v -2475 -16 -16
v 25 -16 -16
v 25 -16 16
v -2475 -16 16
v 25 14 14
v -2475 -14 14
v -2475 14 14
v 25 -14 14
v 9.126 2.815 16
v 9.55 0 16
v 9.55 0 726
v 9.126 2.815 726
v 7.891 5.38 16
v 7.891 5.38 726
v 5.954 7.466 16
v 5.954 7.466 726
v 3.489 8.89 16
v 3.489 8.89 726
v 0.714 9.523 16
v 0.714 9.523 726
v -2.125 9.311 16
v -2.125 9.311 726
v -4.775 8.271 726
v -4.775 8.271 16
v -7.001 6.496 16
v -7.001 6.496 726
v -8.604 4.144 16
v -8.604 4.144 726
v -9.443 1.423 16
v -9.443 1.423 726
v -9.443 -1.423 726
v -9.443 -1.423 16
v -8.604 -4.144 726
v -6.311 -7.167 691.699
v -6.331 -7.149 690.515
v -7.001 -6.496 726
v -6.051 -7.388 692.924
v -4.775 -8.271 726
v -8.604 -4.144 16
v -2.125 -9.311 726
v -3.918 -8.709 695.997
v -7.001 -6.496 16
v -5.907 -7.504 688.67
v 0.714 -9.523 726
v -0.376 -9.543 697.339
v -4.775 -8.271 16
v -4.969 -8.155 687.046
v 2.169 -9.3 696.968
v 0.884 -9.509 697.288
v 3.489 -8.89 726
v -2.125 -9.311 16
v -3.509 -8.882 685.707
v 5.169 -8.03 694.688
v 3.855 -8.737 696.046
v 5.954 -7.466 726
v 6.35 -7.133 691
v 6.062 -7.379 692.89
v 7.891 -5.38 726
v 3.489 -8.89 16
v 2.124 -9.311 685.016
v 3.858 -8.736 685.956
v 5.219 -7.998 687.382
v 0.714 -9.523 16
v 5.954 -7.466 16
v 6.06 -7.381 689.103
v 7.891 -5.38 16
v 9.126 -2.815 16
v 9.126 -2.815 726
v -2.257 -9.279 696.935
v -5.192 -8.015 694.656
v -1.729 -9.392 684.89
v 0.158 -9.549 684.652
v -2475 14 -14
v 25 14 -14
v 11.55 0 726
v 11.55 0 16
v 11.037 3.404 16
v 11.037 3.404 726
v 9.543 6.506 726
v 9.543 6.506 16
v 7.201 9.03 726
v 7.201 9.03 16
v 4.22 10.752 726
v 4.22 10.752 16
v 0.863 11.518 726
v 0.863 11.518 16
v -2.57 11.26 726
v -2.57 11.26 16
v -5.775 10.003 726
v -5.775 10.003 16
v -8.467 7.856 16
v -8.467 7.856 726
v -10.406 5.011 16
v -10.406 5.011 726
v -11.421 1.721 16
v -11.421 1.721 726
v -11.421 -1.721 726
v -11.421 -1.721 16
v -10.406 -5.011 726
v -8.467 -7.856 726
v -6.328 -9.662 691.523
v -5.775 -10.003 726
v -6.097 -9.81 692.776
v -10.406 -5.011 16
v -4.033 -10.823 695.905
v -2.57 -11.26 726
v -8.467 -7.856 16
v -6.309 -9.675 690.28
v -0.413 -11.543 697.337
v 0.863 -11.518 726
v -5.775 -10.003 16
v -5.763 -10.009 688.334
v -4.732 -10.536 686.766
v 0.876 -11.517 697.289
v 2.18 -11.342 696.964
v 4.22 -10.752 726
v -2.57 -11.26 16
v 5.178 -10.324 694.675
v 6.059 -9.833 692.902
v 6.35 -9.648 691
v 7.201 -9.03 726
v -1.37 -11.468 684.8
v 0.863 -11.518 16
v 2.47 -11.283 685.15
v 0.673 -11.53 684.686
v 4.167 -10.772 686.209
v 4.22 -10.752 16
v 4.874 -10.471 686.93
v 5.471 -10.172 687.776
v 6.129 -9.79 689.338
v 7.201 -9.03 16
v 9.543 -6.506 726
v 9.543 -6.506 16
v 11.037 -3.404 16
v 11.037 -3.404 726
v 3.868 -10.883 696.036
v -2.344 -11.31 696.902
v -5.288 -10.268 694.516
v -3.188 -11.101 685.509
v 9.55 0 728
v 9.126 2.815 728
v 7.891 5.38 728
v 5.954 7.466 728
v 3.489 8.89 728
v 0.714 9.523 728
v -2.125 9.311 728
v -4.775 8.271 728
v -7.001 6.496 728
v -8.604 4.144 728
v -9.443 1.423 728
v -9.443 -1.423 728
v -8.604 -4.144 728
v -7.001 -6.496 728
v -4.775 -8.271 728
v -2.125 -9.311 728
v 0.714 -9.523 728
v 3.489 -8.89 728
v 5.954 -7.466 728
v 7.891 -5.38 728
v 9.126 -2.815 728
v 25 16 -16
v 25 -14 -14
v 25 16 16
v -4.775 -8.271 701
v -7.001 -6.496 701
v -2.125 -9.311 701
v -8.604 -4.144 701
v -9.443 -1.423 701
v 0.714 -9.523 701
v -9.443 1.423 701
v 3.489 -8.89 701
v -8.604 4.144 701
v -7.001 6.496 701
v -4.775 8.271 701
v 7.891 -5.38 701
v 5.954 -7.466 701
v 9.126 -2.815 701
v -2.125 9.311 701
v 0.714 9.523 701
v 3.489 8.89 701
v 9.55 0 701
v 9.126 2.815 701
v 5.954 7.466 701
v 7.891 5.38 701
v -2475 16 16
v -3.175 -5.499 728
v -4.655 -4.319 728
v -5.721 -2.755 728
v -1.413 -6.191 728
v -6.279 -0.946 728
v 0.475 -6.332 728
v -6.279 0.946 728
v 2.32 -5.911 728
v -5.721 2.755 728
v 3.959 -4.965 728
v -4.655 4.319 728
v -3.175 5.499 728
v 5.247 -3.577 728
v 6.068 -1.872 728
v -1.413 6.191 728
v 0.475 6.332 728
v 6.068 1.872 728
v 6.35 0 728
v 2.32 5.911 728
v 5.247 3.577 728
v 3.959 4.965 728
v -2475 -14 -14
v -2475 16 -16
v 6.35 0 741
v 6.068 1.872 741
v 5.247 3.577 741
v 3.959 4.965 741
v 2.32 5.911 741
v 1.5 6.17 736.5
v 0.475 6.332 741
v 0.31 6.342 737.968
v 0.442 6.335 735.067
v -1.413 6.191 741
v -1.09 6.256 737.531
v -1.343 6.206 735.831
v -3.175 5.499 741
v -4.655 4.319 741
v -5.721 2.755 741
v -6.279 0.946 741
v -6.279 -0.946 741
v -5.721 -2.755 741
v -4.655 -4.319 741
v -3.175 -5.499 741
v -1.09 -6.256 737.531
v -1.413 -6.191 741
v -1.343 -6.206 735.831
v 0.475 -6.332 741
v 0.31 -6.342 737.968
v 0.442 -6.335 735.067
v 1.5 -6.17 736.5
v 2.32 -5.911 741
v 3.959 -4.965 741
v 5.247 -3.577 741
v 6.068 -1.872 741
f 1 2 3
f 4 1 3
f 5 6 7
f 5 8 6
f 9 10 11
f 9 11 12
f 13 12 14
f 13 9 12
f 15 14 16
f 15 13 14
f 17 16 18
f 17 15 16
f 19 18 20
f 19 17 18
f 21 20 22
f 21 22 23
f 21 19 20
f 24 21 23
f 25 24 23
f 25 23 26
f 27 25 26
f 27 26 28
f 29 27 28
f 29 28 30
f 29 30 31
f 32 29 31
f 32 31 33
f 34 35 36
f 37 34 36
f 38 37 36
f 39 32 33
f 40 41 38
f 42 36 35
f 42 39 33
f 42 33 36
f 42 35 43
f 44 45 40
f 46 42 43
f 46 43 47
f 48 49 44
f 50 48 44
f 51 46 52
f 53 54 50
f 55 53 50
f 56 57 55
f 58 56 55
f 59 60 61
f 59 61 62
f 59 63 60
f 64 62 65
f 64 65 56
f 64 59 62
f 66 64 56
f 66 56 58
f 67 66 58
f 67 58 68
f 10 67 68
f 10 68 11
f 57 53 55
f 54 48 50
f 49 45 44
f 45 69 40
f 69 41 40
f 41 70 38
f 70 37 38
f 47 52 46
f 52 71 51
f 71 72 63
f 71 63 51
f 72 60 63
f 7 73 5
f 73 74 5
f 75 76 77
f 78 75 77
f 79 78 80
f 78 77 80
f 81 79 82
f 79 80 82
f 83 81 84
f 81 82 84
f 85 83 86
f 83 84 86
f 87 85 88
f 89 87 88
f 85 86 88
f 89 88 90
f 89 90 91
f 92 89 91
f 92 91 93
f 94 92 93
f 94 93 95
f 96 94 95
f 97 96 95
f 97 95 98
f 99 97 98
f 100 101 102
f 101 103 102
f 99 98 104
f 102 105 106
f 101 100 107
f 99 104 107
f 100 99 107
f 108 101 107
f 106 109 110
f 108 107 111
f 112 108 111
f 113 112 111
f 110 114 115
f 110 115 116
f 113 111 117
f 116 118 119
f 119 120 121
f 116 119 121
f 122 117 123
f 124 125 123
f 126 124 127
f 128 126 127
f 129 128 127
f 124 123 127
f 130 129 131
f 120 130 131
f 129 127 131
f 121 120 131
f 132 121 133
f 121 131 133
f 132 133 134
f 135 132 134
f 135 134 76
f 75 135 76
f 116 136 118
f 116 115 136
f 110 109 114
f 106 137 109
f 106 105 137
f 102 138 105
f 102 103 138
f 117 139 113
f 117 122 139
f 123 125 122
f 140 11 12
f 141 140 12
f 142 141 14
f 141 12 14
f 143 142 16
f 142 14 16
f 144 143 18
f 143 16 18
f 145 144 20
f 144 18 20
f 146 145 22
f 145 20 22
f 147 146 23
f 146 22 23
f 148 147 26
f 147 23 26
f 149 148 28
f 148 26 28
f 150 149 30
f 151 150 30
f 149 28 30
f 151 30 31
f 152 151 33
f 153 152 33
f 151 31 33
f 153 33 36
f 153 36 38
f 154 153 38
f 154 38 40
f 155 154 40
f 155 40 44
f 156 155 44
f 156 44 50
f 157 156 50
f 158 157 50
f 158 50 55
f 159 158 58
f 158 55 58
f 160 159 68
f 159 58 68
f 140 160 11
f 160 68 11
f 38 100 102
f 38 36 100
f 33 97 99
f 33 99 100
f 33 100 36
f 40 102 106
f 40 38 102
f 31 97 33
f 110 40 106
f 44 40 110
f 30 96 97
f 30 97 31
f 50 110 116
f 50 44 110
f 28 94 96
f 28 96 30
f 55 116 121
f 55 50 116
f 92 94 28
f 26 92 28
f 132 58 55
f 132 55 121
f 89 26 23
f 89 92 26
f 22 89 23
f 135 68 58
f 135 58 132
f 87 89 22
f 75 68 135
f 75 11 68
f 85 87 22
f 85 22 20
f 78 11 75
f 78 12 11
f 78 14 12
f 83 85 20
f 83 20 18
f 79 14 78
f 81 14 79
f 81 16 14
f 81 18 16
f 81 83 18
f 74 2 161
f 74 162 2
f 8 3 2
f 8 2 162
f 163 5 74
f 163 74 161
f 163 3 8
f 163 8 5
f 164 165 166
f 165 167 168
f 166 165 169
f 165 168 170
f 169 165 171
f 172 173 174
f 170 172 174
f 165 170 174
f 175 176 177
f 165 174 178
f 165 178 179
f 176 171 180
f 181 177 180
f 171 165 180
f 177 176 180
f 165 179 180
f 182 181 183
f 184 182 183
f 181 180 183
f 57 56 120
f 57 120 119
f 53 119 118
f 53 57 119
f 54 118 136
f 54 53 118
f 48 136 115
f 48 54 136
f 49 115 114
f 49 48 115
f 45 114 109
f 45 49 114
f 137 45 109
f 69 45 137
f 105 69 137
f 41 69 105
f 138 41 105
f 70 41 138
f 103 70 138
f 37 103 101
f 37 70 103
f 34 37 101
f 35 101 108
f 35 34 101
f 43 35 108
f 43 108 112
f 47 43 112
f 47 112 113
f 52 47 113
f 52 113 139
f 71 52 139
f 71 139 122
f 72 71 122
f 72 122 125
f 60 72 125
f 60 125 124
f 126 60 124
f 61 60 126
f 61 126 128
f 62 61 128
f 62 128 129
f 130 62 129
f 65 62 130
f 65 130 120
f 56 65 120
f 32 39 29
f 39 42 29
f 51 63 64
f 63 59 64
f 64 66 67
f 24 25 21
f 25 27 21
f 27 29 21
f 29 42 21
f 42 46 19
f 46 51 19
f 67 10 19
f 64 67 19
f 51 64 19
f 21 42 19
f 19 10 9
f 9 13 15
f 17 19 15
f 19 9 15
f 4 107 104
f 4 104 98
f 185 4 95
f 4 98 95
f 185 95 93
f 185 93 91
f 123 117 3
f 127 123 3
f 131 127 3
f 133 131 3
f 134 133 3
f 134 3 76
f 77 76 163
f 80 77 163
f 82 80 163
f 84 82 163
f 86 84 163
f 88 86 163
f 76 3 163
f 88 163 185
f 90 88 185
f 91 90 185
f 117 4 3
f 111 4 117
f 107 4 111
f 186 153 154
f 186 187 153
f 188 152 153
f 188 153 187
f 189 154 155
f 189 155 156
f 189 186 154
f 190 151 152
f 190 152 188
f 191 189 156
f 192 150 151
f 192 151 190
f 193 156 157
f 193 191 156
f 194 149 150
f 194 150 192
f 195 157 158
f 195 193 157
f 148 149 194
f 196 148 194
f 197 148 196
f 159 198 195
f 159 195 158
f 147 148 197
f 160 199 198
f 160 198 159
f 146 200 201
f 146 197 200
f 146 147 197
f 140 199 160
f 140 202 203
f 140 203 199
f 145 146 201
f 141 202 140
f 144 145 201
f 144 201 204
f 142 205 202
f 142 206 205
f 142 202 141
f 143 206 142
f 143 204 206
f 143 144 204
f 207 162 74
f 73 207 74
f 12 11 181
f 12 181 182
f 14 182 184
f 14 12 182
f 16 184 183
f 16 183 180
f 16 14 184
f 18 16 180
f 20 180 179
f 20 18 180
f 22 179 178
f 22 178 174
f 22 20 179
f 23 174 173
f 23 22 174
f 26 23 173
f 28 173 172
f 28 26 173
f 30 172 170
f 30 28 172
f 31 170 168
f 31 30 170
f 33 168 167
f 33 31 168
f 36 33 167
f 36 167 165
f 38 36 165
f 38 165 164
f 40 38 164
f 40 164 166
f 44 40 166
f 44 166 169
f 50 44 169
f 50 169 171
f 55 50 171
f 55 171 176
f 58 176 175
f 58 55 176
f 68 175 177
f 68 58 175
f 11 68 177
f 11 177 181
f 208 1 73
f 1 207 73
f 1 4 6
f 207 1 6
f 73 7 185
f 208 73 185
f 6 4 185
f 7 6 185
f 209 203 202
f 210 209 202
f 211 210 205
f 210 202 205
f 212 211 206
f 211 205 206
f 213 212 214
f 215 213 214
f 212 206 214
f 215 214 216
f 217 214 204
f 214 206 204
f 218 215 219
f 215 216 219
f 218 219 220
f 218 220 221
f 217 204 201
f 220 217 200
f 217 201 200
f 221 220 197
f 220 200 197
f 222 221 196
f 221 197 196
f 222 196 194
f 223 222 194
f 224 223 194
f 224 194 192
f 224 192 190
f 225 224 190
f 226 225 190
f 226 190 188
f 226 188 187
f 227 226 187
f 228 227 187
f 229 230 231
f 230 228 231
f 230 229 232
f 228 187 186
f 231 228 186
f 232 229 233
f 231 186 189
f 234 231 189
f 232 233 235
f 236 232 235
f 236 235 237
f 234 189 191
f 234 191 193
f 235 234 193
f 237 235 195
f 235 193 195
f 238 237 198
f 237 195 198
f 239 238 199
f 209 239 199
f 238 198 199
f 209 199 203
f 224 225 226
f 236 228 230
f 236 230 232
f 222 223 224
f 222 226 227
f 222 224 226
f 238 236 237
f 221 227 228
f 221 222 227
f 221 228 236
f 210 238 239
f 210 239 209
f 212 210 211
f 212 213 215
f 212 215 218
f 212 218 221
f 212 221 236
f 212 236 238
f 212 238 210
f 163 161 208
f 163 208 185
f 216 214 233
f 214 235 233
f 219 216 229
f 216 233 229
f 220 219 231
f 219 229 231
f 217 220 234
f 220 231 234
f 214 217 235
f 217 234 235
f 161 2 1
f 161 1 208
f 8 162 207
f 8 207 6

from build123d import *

# Parameters (mm, degrees)
F0_W      = 32
F0_H      = 32
F0_W_2    = 28
F0_H_2    = 28
F1_DEPTH  = 25
F2_DEPTH  = 2475
F3_R      = 11.55
F3_R_2    = 9.55
F4_DEPTH  = 710
F5_R      = 9.55
F6_DEPTH  = 25
F7_R      = 6.35
F8_DEPTH  = 15
F9_R      = 1.5
F10_DEPTH = 6.5
F11_R     = 9.55
F11_R_2   = 6.35
F12_DEPTH = 2
F13_R     = 6.35
F14_DEPTH = 25


with BuildPart() as f1:
    # F0 (on Right) → F1 (new body)
    with BuildSketch(Plane.YZ):
        Rectangle(F0_W, F0_H)
        Rectangle(F0_W_2, F0_H_2, mode=Mode.SUBTRACT)
    extrude(amount=F1_DEPTH)

    # F0 (on Right) → F2 (join)
    with BuildSketch(Plane.YZ):
        Rectangle(F0_W, F0_H)
        Rectangle(F0_W_2, F0_H_2, mode=Mode.SUBTRACT)
    extrude(amount=-F2_DEPTH)

    # F3 (on face) → F4 (join)
    with BuildSketch(Plane.XY.offset(16)):
        Circle(F3_R)
        Circle(F3_R_2, mode=Mode.SUBTRACT)
    extrude(amount=F4_DEPTH)

    # F13 (on Front) → F14 (cut)
    with BuildSketch(Plane.XZ):
        with Locations((0, 691)):
            Circle(F13_R)
    extrude(amount=F14_DEPTH, mode=Mode.SUBTRACT)


with BuildPart() as f6:
    # F5 (on face) → F6 (new body)
    with BuildSketch(Plane.XY.offset(726)):
        Circle(F5_R)
    extrude(amount=-F6_DEPTH)

    # F7 (on face) → F8 (join)
    with BuildSketch(Plane.XY.offset(726)):
        Circle(F7_R)
    extrude(amount=F8_DEPTH)

    # F9 (on Front) → F10 (cut, symmetric)
    with BuildSketch(Plane.XZ):
        with Locations((0, 736.5)):
            Circle(F9_R)
    extrude(amount=F10_DEPTH, both=True, mode=Mode.SUBTRACT)

    # F11 (on face) → F12 (join)
    with BuildSketch(Plane.XY.offset(726)):
        Circle(F11_R)
        Circle(F11_R_2, mode=Mode.SUBTRACT)
    extrude(amount=F12_DEPTH)


solid = Compound([f1.part, f6.part])
